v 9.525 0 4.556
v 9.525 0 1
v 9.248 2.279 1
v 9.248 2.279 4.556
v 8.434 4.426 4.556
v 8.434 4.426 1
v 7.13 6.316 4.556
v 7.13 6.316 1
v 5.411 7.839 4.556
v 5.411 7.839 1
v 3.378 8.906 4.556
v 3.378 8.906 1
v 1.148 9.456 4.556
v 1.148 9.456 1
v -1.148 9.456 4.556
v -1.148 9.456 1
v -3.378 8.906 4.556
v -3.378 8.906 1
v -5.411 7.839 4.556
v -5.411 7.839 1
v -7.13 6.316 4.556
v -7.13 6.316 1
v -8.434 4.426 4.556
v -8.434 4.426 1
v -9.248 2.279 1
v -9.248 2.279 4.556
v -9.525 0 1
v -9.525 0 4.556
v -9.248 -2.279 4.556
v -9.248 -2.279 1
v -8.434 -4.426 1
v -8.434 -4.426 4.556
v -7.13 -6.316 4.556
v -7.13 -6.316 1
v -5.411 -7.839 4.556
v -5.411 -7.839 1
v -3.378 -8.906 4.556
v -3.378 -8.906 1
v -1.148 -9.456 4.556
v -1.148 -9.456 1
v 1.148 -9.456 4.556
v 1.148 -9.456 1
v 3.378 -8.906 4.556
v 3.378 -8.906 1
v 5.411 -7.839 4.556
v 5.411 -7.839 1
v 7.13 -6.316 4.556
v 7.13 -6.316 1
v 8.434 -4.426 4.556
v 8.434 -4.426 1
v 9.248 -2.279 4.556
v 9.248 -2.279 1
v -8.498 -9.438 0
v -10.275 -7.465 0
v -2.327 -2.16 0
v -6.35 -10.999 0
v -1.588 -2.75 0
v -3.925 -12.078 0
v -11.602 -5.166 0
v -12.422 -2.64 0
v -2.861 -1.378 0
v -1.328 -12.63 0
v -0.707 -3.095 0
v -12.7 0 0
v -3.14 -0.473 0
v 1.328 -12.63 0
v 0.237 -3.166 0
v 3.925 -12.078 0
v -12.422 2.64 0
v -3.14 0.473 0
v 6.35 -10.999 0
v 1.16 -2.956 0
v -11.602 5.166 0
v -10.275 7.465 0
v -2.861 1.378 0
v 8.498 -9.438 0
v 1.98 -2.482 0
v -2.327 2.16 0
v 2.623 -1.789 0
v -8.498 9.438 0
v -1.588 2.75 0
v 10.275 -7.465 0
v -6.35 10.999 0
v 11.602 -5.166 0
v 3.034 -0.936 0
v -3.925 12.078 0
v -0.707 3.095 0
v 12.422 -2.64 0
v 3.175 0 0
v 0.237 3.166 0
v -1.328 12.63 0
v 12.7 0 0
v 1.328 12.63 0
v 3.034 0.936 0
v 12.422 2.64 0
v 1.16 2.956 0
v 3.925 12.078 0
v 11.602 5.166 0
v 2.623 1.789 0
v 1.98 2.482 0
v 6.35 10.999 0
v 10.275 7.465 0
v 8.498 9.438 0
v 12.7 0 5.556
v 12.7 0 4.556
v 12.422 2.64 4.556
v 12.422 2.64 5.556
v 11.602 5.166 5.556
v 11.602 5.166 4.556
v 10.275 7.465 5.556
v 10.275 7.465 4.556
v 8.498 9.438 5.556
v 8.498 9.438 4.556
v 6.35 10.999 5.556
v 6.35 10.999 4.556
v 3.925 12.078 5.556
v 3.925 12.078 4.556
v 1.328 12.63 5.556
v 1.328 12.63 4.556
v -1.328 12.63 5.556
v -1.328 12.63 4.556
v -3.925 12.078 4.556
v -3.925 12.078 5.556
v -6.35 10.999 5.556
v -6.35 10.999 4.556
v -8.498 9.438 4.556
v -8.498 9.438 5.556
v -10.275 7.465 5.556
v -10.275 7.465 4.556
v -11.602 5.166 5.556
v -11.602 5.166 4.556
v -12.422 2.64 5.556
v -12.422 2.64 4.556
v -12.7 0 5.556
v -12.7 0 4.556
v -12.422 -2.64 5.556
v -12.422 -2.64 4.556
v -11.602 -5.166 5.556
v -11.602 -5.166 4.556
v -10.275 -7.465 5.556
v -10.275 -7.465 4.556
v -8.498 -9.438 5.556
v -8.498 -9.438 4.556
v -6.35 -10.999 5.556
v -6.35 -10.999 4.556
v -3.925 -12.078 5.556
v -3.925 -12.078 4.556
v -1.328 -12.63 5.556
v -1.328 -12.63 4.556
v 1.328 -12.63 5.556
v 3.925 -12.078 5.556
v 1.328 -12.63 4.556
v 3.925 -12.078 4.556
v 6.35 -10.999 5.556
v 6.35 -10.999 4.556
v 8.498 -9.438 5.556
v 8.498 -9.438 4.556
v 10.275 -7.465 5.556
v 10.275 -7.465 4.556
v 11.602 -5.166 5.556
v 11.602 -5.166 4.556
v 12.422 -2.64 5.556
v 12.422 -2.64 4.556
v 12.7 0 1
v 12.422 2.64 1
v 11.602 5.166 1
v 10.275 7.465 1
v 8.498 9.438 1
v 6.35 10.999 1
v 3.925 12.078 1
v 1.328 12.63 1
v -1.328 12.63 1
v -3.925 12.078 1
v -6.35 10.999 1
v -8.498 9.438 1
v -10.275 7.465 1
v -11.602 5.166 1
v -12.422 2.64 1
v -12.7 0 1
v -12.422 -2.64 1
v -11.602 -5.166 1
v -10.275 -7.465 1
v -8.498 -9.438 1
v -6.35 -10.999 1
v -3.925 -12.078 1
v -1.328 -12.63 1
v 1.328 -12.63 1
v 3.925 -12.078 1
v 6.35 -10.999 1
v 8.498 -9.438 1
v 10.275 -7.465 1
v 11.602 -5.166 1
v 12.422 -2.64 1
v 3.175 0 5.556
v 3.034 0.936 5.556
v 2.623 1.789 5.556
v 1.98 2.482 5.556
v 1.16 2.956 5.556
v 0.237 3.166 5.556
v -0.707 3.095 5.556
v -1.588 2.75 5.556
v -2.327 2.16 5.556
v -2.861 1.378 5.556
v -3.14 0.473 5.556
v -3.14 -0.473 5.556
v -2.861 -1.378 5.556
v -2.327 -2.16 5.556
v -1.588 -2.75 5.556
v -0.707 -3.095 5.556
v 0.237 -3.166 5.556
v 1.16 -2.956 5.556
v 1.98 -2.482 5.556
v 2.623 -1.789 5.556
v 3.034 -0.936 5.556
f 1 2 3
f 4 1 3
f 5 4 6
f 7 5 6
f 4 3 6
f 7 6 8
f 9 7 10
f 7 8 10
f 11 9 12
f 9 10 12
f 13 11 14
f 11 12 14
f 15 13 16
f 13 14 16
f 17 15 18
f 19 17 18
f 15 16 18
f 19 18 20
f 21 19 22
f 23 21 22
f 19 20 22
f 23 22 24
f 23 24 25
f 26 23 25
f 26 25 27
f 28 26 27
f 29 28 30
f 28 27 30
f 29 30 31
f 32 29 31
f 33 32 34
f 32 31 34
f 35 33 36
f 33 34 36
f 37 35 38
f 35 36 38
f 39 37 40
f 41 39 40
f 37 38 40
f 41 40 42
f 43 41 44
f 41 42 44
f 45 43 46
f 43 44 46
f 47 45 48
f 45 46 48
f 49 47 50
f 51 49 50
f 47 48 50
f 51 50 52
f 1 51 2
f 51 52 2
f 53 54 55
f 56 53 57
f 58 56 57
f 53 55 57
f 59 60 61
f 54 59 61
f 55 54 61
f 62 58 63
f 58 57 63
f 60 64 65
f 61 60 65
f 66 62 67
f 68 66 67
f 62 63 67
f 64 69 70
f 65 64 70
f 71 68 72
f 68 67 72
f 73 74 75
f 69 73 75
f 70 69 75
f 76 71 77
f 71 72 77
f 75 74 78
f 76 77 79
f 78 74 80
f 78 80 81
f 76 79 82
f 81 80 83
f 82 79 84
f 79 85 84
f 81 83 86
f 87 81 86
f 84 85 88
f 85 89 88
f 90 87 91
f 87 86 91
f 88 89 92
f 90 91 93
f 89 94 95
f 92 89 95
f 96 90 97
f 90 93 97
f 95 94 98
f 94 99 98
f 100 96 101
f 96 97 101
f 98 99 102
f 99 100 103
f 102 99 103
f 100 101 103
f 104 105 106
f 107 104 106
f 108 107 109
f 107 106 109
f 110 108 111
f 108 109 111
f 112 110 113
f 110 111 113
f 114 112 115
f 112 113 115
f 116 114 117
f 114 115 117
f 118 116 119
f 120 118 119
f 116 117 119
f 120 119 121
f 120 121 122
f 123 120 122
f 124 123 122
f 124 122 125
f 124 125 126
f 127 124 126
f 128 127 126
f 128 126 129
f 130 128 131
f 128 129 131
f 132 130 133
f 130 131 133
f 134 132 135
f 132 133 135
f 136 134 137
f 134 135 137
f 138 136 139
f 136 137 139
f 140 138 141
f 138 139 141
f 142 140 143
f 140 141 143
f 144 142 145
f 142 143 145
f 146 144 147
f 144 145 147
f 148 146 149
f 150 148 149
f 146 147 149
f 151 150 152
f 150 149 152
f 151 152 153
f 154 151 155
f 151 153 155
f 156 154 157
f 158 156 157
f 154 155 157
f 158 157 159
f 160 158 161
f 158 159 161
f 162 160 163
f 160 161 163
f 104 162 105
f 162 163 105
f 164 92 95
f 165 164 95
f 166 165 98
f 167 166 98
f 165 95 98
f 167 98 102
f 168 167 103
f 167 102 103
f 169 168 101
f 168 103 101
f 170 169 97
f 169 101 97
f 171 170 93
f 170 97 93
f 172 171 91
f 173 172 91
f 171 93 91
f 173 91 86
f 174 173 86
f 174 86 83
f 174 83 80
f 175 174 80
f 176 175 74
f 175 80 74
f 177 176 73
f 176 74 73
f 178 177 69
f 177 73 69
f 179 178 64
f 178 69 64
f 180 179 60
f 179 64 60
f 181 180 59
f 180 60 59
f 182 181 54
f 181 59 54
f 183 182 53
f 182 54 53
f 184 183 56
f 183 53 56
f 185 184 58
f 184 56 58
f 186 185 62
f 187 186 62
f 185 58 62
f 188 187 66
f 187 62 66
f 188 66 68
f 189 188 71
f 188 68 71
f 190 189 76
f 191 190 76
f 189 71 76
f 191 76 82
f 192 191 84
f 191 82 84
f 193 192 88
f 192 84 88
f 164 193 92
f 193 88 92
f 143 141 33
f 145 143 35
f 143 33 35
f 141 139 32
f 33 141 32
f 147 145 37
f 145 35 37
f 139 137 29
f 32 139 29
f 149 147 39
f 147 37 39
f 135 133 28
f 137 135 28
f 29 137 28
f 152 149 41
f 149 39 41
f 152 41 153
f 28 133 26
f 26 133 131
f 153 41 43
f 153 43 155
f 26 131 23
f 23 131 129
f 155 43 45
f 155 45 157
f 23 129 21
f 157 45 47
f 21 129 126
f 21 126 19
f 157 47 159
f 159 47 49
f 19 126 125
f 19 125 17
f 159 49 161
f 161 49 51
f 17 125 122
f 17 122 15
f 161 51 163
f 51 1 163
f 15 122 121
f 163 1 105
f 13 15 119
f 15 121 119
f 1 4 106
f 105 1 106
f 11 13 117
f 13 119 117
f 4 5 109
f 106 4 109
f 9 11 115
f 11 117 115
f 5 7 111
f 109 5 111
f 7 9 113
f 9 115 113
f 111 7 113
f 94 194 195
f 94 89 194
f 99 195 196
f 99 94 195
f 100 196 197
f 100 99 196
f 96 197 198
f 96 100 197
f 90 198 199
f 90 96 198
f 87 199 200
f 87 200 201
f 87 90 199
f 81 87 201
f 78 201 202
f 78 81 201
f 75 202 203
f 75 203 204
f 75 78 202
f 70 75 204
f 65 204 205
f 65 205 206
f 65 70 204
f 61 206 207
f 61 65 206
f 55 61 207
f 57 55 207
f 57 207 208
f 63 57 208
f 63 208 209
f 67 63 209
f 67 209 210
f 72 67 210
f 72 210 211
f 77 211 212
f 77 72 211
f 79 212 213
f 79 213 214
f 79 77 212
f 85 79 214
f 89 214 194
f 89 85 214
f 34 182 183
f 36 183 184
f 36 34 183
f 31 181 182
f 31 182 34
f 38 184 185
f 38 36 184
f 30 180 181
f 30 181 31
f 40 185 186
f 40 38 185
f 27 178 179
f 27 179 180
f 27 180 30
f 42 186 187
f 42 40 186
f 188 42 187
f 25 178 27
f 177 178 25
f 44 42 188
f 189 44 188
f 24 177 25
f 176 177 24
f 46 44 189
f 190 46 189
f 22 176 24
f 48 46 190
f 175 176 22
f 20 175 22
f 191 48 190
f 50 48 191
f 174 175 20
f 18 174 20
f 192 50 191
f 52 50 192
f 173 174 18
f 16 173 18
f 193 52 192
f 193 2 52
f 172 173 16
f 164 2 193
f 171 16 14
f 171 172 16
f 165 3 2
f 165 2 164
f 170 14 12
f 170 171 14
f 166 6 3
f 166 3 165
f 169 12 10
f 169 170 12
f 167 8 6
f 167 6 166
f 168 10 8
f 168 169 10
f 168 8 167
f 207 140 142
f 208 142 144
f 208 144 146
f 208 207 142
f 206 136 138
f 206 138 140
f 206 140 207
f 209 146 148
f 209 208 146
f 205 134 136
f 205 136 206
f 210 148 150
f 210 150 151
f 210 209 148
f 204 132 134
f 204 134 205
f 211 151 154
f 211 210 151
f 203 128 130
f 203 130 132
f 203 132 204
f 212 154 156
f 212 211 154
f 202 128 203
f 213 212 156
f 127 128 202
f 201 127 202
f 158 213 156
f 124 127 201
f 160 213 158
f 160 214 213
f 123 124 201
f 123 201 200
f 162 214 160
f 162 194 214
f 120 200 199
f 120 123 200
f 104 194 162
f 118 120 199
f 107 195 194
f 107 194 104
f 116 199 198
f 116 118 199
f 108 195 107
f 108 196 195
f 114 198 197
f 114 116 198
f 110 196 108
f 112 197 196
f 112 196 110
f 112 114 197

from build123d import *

# Parameters (mm, degrees)
F0_R     = 12.7
F0_R_2   = 3.175
F1_DEPTH = 1.00000054
F2_R     = 9.525
F2_R_2   = 3.175
F3_DEPTH = 3.556
F4_R     = 12.7
F4_R_2   = 9.525
F4_R_3   = 3.175
F5_DEPTH = 1.00000054


# Not quite as in the source:
# - a feature names something its author has since deleted; it is built from what else it names


with BuildPart() as f1:
    # F0 (on Top) → F1 (new body)
    with BuildSketch(Plane.XY):
        Circle(F0_R)
        Circle(F0_R_2, mode=Mode.SUBTRACT)
    extrude(amount=F1_DEPTH)

    # F2 (on face) → F3 (join)
    with BuildSketch(Plane.XY.offset(1.00000054)):
        Circle(F2_R)
        Circle(F2_R_2, mode=Mode.SUBTRACT)
    extrude(amount=F3_DEPTH)

    # F4 (on face) → F5 (join)
    with BuildSketch(Plane.XY.offset(4.55600054)):
        Circle(F4_R)
        Circle(F4_R_2, mode=Mode.SUBTRACT)
        Circle(F4_R_2)
        Circle(F4_R_3, mode=Mode.SUBTRACT)
    extrude(amount=F5_DEPTH)


solid = f1.part
